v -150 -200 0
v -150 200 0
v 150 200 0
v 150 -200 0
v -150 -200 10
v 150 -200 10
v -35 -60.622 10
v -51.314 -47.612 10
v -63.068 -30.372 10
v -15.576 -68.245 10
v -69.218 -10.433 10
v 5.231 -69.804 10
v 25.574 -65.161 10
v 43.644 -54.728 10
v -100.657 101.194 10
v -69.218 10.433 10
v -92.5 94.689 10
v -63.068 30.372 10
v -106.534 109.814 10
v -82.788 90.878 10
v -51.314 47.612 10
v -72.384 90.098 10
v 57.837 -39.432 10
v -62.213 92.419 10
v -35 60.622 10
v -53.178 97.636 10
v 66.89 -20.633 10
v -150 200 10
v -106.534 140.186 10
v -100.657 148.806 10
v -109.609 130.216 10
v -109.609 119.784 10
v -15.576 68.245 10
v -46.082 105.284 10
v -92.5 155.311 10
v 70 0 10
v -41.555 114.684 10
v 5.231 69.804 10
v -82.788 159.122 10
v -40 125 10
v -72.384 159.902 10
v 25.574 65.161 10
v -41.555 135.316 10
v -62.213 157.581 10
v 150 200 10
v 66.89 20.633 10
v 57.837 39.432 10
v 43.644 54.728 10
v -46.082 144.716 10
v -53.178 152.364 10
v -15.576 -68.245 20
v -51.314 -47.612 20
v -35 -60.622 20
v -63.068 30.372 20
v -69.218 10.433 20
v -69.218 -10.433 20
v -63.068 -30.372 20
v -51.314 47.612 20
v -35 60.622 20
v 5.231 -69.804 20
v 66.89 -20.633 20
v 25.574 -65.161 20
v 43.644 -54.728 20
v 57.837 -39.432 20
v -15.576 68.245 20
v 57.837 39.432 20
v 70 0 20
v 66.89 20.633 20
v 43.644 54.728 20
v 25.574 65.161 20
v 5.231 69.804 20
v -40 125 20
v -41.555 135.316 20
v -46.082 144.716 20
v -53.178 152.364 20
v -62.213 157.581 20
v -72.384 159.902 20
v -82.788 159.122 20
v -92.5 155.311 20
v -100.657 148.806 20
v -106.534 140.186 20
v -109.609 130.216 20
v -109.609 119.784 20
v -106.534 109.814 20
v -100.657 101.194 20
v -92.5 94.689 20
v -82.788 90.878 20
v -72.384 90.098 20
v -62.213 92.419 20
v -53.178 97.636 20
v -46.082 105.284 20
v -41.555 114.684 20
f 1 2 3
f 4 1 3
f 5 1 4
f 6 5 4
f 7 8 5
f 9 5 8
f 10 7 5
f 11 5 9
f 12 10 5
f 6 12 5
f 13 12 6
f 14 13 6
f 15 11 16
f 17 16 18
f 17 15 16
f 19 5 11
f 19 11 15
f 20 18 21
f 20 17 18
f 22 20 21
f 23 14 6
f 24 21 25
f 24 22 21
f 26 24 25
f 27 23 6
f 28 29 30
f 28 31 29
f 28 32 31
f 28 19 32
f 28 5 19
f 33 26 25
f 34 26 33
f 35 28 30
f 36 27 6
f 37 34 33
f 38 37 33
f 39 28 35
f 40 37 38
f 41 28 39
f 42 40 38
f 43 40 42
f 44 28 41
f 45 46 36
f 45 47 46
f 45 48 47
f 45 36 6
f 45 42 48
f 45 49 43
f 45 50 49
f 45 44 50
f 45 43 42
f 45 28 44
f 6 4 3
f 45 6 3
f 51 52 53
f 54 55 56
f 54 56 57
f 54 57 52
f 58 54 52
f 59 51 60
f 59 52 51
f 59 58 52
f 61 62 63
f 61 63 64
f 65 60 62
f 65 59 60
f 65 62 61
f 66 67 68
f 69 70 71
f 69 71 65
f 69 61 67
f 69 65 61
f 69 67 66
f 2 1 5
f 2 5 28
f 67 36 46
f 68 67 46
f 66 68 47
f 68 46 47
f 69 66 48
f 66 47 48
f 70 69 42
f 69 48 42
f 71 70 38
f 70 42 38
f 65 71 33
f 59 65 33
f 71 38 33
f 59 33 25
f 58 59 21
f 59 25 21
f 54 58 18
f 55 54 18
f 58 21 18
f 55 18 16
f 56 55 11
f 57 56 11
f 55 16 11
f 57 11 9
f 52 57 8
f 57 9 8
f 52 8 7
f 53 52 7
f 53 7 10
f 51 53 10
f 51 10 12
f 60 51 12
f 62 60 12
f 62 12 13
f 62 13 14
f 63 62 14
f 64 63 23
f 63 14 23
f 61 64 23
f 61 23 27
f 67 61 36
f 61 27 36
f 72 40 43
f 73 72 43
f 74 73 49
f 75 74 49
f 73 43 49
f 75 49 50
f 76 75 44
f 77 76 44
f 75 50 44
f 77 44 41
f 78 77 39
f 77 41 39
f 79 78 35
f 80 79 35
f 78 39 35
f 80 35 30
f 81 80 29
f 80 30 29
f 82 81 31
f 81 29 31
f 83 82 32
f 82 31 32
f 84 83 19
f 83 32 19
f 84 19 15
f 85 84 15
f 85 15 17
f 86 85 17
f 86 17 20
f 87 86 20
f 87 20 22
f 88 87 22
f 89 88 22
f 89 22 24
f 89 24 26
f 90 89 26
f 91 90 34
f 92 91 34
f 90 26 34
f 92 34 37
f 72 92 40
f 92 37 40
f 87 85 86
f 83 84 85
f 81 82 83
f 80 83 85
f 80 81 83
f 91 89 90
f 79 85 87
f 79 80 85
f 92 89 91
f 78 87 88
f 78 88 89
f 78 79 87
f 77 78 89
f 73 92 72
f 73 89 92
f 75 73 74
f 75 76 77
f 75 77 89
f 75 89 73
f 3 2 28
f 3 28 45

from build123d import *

# Parameters (mm, degrees)
F0_W     = 300
F0_H     = 400
F1_DEPTH = 10
F2_R     = 35
F3_DEPTH = 10
F4_R     = 70
F5_DEPTH = 10


with BuildPart() as f1:
    # F0 (on Top) → F1 (new body)
    with BuildSketch(Plane.XY):
        Rectangle(F0_W, F0_H)
    extrude(amount=F1_DEPTH)

    # F2 (on face) → F3 (join)
    with BuildSketch(Plane.XY.offset(10)):
        with Locations((-75, 125)):
            Circle(F2_R)
    extrude(amount=F3_DEPTH)

    # F4 (on face) → F5 (join)
    with BuildSketch(Plane.XY.offset(10)):
        Circle(F4_R)
    extrude(amount=F5_DEPTH)


solid = f1.part
